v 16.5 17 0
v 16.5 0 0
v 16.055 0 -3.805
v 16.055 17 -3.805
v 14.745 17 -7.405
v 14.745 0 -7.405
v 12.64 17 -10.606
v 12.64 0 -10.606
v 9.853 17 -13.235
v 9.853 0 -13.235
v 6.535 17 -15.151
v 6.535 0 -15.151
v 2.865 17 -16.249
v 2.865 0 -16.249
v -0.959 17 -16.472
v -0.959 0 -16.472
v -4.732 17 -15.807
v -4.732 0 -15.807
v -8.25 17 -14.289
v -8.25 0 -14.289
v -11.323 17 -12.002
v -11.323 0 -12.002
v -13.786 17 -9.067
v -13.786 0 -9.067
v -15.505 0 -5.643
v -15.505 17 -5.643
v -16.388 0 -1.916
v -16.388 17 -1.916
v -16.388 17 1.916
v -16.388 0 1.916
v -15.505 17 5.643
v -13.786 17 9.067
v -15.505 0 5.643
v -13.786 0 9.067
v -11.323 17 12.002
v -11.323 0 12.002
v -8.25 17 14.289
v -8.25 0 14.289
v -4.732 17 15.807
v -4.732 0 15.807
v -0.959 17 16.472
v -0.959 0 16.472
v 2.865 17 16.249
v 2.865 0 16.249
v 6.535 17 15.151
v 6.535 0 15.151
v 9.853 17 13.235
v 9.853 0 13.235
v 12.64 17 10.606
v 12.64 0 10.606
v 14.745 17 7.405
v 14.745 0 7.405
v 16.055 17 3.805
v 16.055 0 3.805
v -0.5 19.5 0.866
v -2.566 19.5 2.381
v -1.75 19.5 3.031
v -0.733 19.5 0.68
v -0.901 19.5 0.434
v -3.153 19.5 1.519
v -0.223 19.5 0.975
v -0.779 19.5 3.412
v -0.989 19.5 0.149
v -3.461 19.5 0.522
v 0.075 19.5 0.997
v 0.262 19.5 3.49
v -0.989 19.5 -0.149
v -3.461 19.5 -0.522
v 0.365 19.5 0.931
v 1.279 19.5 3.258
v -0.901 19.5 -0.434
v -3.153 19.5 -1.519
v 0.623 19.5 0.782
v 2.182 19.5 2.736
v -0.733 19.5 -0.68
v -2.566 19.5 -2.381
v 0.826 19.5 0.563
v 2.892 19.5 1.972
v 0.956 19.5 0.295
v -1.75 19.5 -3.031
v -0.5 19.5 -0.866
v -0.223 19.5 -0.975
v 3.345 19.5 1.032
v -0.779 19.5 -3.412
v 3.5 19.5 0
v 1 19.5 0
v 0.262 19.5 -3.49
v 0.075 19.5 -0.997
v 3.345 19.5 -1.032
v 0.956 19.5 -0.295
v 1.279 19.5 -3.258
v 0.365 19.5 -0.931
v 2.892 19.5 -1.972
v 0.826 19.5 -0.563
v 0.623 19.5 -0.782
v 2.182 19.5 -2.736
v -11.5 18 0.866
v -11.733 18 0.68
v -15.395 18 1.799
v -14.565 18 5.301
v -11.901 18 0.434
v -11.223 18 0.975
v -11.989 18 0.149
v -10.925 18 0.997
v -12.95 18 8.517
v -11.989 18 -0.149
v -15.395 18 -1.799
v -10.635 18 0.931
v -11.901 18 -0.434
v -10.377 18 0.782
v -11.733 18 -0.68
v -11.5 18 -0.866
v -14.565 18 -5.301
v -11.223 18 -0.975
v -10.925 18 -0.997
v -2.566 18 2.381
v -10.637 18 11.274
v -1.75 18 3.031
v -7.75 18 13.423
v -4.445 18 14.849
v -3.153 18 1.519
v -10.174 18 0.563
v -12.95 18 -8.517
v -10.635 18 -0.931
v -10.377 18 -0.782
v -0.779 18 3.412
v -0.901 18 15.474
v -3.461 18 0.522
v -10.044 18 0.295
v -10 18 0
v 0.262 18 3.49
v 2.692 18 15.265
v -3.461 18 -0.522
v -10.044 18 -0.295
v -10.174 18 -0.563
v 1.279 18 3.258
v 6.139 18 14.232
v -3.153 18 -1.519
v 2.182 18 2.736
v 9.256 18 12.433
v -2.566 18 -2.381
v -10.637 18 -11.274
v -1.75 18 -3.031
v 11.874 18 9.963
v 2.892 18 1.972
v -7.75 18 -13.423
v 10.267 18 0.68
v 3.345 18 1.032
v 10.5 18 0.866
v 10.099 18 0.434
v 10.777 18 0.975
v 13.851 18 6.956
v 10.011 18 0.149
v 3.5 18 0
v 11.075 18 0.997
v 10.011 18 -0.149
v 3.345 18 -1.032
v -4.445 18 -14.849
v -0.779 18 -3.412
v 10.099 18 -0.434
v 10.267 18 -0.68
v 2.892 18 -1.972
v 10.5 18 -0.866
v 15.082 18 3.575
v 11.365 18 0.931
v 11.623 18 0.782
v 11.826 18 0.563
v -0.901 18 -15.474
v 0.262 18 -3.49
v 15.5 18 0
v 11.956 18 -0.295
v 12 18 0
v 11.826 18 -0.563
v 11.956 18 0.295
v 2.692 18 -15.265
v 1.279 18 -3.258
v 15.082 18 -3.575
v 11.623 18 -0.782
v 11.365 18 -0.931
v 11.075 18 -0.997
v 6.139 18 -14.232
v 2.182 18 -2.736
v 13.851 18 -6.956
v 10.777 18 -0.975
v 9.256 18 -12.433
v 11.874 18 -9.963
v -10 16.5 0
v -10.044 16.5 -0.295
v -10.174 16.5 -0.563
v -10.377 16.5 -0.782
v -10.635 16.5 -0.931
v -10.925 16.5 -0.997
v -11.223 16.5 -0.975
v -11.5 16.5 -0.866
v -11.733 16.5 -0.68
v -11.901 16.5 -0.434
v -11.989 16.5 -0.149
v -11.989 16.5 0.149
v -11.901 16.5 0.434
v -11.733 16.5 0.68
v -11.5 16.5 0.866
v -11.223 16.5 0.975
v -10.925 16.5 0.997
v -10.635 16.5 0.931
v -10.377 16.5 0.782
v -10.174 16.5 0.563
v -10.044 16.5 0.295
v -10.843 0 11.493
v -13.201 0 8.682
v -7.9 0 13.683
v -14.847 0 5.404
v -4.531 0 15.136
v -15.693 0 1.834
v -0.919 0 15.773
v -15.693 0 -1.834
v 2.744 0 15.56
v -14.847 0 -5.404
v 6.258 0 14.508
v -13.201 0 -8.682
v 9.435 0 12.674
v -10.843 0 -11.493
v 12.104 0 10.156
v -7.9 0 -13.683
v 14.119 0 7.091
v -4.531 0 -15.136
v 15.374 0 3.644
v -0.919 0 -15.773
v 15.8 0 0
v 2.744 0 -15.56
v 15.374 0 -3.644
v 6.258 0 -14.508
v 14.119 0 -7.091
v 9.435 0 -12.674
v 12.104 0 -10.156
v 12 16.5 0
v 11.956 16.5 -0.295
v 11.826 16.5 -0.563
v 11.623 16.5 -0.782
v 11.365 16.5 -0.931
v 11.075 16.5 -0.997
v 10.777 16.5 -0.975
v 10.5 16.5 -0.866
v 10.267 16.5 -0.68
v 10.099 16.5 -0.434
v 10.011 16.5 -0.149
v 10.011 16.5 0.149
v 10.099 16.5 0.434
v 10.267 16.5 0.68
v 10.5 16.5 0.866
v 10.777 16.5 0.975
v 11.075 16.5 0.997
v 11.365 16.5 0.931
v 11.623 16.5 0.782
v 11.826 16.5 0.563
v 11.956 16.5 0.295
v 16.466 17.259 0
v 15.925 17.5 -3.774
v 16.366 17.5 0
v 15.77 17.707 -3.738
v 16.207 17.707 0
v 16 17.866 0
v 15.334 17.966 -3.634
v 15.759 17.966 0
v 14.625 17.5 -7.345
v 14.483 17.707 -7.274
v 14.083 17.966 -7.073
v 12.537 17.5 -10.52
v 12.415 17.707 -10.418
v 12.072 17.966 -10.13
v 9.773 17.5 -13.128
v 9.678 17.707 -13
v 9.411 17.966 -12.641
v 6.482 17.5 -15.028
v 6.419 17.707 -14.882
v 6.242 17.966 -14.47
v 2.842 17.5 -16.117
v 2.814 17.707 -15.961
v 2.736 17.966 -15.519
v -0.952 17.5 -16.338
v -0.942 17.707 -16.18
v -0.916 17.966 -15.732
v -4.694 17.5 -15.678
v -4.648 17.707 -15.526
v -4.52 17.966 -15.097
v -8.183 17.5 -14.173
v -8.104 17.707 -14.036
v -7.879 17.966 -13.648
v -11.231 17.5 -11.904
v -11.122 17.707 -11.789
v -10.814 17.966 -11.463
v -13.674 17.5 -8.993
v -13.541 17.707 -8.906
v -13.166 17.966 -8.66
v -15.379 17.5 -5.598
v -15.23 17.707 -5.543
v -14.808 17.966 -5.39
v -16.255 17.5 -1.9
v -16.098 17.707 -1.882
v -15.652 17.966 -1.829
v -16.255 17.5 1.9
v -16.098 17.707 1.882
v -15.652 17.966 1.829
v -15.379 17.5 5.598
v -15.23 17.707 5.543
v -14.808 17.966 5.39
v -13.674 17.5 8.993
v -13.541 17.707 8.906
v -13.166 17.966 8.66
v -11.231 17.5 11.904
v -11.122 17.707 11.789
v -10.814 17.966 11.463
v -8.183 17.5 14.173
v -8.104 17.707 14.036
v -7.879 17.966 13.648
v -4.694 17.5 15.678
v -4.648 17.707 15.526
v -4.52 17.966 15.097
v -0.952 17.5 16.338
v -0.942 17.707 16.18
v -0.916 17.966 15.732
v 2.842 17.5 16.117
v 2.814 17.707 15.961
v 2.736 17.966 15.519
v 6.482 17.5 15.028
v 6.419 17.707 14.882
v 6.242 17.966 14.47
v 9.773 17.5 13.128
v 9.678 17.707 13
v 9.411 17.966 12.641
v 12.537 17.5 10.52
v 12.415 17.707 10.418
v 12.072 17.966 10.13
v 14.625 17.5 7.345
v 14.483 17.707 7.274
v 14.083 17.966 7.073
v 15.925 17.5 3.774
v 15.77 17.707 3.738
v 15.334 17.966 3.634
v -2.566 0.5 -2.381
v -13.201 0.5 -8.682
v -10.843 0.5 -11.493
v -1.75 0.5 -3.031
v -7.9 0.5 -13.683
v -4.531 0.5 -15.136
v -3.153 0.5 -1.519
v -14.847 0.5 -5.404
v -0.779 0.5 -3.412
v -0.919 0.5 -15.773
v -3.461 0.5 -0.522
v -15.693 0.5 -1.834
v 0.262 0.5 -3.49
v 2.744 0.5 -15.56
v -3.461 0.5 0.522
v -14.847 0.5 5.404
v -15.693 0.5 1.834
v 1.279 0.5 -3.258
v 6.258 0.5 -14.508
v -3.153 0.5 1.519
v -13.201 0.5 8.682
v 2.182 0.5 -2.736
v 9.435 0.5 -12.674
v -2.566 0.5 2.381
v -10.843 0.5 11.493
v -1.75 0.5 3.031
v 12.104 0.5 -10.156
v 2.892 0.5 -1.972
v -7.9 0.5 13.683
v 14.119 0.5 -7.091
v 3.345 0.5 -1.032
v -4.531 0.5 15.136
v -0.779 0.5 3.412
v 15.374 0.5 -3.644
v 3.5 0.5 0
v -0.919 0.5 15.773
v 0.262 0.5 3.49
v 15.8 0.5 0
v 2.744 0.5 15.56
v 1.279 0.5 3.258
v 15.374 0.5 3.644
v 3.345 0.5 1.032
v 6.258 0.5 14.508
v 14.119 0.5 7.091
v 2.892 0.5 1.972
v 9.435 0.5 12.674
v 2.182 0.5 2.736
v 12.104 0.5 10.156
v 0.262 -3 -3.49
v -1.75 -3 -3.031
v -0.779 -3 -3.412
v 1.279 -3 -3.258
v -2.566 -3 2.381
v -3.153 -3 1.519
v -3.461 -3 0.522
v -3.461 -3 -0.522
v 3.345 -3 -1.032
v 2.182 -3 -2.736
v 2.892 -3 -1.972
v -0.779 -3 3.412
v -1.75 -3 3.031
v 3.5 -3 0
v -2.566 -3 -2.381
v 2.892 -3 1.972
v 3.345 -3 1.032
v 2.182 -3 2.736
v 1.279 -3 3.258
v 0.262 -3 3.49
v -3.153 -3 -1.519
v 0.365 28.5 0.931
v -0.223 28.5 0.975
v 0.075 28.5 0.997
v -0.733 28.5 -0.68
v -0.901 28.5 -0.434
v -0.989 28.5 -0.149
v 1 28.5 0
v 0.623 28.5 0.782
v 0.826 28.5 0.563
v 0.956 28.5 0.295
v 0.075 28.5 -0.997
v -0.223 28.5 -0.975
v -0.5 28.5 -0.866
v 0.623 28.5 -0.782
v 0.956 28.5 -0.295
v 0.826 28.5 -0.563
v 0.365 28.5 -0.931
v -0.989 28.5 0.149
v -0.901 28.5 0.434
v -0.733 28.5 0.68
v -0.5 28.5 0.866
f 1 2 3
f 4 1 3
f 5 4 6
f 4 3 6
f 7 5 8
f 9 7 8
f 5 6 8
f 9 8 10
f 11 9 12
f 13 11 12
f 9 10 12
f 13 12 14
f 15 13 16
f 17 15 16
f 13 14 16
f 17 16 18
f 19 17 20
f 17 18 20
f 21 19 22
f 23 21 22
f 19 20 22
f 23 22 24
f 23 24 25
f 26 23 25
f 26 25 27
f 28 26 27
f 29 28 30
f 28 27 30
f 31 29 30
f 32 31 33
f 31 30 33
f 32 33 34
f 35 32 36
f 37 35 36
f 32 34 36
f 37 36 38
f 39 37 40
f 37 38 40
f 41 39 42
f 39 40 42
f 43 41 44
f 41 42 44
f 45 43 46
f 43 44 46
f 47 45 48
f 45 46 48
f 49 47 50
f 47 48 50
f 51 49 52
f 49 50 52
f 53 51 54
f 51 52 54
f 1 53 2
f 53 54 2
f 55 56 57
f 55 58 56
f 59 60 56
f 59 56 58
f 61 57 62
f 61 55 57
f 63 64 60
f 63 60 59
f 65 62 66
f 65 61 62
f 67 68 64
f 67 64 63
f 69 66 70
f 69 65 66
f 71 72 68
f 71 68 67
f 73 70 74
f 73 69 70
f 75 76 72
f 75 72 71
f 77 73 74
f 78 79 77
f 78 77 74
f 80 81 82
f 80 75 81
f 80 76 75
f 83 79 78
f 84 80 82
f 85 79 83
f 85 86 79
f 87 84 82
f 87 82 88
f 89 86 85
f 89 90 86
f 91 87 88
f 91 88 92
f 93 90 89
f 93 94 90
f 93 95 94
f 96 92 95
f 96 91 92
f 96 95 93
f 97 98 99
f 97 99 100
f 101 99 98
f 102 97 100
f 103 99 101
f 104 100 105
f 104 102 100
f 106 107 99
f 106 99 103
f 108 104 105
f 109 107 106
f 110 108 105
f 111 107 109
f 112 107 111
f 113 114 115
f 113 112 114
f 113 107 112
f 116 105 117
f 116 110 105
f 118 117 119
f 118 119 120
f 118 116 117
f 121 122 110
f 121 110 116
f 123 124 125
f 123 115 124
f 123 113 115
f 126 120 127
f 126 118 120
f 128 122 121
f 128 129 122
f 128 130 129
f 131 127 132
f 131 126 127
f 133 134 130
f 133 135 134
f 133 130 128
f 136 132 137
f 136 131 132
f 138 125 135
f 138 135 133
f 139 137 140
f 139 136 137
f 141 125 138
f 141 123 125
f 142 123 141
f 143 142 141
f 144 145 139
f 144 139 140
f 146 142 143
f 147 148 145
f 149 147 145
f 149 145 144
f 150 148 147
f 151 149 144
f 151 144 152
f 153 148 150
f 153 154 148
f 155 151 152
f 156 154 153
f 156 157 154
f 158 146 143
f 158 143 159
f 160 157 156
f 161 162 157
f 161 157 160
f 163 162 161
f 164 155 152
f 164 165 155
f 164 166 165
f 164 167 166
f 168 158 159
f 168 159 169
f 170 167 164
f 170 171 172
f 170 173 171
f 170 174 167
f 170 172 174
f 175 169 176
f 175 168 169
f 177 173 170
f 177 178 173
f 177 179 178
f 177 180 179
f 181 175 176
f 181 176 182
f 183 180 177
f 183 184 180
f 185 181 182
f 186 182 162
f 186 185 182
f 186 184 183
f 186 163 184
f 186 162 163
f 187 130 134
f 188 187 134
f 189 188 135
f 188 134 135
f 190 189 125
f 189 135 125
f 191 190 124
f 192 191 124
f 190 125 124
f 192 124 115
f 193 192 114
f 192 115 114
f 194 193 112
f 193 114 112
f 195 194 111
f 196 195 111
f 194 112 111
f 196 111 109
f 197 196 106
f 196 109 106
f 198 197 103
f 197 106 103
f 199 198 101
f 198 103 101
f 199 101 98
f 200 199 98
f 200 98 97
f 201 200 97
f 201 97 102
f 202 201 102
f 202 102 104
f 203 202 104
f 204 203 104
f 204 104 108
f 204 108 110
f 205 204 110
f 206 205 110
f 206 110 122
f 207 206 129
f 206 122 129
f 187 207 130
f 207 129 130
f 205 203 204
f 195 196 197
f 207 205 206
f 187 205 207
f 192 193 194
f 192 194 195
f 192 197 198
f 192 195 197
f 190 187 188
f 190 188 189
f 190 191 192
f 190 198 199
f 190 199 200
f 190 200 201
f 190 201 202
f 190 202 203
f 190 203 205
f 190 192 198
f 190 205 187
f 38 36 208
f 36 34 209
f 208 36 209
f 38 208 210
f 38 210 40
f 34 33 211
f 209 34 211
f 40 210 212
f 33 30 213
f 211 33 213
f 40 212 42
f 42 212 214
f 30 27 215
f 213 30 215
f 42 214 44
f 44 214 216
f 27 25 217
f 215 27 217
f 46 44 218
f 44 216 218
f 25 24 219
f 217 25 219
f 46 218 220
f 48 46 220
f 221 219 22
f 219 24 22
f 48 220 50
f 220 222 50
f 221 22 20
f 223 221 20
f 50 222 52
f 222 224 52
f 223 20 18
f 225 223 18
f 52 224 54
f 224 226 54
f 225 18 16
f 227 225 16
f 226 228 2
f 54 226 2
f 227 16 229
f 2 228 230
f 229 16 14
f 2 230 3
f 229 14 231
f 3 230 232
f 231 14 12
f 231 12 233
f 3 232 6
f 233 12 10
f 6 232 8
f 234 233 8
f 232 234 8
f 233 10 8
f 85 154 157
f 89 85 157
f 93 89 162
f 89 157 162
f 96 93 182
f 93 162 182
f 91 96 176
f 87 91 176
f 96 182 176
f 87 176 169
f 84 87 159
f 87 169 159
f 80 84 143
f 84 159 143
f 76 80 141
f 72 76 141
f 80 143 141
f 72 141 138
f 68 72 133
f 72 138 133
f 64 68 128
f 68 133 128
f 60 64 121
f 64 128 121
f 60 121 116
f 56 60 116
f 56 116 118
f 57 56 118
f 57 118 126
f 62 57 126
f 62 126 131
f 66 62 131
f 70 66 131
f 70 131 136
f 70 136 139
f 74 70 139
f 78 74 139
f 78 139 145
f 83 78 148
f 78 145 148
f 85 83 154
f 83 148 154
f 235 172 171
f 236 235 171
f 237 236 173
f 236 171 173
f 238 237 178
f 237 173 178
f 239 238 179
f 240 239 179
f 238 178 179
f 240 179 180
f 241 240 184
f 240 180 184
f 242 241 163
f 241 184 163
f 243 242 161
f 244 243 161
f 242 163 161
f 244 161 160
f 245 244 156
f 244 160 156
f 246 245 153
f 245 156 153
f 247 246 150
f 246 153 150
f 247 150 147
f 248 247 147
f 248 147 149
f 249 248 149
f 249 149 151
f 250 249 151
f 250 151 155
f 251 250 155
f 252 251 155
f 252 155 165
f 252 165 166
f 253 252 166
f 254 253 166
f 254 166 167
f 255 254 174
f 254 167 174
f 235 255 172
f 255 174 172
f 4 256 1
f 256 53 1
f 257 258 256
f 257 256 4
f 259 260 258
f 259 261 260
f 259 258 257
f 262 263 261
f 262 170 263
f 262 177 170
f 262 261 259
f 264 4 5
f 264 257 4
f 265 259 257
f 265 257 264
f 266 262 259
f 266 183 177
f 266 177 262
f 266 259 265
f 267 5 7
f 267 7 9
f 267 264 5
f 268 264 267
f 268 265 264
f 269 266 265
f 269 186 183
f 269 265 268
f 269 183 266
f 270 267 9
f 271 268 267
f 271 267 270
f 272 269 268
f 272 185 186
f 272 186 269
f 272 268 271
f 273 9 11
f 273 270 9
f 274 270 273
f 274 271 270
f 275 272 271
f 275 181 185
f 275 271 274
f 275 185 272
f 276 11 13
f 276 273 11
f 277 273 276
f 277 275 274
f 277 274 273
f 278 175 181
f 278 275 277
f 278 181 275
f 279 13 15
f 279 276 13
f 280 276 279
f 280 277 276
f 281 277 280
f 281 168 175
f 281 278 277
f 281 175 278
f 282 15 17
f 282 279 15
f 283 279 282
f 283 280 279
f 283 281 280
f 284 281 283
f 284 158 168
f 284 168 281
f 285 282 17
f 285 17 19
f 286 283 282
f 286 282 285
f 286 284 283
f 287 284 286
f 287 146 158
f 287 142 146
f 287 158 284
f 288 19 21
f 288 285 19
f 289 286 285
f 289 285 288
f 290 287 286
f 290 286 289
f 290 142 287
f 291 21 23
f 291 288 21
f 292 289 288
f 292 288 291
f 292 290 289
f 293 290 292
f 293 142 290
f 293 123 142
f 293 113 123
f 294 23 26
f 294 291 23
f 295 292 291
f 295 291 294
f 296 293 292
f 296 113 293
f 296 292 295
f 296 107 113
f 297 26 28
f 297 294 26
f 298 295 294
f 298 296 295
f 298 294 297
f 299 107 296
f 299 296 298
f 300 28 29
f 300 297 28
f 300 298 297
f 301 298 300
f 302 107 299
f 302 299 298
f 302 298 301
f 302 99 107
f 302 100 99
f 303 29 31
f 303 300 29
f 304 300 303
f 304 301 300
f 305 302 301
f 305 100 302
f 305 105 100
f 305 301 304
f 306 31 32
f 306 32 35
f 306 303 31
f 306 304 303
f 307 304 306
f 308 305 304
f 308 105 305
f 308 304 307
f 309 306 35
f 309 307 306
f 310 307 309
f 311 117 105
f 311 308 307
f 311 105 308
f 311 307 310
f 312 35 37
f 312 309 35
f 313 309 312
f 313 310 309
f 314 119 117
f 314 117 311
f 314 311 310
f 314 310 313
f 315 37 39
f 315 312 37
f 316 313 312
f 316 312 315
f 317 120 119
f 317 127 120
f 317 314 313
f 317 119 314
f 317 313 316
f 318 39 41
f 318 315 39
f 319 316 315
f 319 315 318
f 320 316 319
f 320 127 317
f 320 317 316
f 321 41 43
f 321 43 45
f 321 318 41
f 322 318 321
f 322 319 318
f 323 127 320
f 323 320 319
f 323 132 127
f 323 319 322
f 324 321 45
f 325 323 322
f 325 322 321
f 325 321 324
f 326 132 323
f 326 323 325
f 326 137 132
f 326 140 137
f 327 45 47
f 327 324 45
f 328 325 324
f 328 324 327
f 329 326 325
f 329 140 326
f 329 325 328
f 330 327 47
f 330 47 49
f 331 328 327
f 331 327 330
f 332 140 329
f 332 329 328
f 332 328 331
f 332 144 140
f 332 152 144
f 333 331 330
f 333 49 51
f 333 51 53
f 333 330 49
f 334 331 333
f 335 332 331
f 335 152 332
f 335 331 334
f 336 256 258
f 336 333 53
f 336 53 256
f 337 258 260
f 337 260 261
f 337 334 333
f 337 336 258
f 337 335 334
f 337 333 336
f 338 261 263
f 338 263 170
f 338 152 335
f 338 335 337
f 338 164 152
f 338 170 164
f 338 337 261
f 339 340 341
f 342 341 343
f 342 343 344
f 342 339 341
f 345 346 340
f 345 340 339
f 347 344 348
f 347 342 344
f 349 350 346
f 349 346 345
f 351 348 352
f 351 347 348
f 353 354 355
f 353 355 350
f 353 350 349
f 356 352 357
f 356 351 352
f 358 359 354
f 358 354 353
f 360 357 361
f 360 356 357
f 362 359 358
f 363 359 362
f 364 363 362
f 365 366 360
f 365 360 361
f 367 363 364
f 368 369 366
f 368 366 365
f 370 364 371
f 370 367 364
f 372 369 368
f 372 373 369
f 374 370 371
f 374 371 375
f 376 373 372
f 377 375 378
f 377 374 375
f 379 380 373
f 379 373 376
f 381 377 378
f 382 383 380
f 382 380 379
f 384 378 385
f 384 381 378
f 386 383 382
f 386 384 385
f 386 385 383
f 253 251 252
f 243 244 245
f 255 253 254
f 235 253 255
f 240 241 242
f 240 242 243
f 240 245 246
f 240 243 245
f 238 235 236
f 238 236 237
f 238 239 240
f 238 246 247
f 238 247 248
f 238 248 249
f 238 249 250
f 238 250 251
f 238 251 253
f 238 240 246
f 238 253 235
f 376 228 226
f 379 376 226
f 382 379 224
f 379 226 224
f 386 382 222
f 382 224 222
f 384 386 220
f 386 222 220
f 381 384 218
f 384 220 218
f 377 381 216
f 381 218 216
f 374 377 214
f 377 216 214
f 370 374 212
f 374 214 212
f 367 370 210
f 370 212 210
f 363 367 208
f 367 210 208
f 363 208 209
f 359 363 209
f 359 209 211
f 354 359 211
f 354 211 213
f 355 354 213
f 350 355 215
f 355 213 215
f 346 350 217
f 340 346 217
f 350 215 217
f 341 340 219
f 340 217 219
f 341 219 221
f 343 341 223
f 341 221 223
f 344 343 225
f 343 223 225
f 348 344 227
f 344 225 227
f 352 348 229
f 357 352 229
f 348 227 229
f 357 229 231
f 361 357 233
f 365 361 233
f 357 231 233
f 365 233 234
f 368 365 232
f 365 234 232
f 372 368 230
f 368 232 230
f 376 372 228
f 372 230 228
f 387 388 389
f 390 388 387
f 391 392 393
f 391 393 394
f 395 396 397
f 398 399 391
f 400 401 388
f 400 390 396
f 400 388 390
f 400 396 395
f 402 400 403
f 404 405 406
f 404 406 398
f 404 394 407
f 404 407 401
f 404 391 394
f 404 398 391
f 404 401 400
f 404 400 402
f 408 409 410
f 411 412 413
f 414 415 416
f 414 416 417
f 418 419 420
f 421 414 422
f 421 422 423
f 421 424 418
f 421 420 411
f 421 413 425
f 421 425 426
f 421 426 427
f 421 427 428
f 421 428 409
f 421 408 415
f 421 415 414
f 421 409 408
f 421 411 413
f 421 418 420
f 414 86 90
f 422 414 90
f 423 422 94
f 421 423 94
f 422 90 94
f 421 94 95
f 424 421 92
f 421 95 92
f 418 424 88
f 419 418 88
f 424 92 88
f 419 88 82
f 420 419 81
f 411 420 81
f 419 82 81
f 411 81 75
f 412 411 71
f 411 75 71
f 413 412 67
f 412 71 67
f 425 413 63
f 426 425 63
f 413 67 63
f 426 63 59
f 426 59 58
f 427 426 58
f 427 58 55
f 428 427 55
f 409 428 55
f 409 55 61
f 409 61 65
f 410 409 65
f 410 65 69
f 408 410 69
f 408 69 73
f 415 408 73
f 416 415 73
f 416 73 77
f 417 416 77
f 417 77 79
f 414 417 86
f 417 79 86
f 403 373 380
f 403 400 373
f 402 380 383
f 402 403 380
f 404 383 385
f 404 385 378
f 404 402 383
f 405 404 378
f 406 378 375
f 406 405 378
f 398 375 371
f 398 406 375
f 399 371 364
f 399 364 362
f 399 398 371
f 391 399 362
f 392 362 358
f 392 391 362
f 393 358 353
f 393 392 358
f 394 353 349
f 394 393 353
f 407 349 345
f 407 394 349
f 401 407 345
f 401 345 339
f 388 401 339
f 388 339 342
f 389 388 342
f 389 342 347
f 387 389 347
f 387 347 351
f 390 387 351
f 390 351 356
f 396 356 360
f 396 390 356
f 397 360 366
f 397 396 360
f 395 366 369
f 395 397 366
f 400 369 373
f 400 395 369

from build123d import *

# Parameters (mm, degrees)
SKETCH1_R           = 16.5
BOSS_EXTRUDE1_DEPTH = 18
SKETCH2_R           = 3.5
BOSS_EXTRUDE2_DEPTH = 1.5
SKETCH3_R           = 1
BOSS_EXTRUDE3_DEPTH = 9
FILLET1_R           = 1
SKETCH4_R           = 1
CUT_EXTRUDE1_DEPTH  = 1.5
SKETCH5_R           = 3.5
BOSS_EXTRUDE4_DEPTH = 3
SKETCH6_R           = 15.8
SKETCH6_R_2         = 3.5
CUT_EXTRUDE2_DEPTH  = 0.5


with BuildPart() as part:
    # Sketch1 → Boss-Extrude1 (new body)
    with BuildSketch(Plane(origin=(0, 0, 0), x_dir=(1, 0, 0), z_dir=(0, 1, 0))):
        Circle(SKETCH1_R)
    extrude(amount=BOSS_EXTRUDE1_DEPTH)

    # Sketch2 → Boss-Extrude2 (add)
    with BuildSketch(Plane(origin=(0, 18, 0), x_dir=(1, 0, 0), z_dir=(0, 1, 0))):
        Circle(SKETCH2_R)
    extrude(amount=BOSS_EXTRUDE2_DEPTH)

    # Sketch3 → Boss-Extrude3 (add)
    with BuildSketch(Plane(origin=(0, 19.5, 0), x_dir=(1, 0, 0), z_dir=(0, 1, 0))):
        Circle(SKETCH3_R)
    extrude(amount=BOSS_EXTRUDE3_DEPTH)

    # Fillet1
    fillet1_edges = [part.edges().sort_by_distance(p)[0] for p in [
        (-16.5, 18, 0),
    ]]
    fillet(fillet1_edges, radius=FILLET1_R)

    # Sketch4 → Cut-Extrude1 (cut)
    with BuildSketch(Plane(origin=(0, 18, 0), x_dir=(1, 0, 0), z_dir=(0, 1, 0))):
        with Locations((11, 0)):
            Circle(SKETCH4_R)
        with Locations((-11, 0)):
            Circle(SKETCH4_R)
    extrude(amount=-CUT_EXTRUDE1_DEPTH, mode=Mode.SUBTRACT)

    # Sketch5 → Boss-Extrude4 (add)
    with BuildSketch(Plane.XZ):
        Circle(SKETCH5_R)
    extrude(amount=BOSS_EXTRUDE4_DEPTH)

    # Sketch6 → Cut-Extrude2 (cut)
    with BuildSketch(Plane.XZ):
        Circle(SKETCH6_R)
        Circle(SKETCH6_R_2, mode=Mode.SUBTRACT)
    extrude(amount=-CUT_EXTRUDE2_DEPTH, mode=Mode.SUBTRACT)


solid = part.part
